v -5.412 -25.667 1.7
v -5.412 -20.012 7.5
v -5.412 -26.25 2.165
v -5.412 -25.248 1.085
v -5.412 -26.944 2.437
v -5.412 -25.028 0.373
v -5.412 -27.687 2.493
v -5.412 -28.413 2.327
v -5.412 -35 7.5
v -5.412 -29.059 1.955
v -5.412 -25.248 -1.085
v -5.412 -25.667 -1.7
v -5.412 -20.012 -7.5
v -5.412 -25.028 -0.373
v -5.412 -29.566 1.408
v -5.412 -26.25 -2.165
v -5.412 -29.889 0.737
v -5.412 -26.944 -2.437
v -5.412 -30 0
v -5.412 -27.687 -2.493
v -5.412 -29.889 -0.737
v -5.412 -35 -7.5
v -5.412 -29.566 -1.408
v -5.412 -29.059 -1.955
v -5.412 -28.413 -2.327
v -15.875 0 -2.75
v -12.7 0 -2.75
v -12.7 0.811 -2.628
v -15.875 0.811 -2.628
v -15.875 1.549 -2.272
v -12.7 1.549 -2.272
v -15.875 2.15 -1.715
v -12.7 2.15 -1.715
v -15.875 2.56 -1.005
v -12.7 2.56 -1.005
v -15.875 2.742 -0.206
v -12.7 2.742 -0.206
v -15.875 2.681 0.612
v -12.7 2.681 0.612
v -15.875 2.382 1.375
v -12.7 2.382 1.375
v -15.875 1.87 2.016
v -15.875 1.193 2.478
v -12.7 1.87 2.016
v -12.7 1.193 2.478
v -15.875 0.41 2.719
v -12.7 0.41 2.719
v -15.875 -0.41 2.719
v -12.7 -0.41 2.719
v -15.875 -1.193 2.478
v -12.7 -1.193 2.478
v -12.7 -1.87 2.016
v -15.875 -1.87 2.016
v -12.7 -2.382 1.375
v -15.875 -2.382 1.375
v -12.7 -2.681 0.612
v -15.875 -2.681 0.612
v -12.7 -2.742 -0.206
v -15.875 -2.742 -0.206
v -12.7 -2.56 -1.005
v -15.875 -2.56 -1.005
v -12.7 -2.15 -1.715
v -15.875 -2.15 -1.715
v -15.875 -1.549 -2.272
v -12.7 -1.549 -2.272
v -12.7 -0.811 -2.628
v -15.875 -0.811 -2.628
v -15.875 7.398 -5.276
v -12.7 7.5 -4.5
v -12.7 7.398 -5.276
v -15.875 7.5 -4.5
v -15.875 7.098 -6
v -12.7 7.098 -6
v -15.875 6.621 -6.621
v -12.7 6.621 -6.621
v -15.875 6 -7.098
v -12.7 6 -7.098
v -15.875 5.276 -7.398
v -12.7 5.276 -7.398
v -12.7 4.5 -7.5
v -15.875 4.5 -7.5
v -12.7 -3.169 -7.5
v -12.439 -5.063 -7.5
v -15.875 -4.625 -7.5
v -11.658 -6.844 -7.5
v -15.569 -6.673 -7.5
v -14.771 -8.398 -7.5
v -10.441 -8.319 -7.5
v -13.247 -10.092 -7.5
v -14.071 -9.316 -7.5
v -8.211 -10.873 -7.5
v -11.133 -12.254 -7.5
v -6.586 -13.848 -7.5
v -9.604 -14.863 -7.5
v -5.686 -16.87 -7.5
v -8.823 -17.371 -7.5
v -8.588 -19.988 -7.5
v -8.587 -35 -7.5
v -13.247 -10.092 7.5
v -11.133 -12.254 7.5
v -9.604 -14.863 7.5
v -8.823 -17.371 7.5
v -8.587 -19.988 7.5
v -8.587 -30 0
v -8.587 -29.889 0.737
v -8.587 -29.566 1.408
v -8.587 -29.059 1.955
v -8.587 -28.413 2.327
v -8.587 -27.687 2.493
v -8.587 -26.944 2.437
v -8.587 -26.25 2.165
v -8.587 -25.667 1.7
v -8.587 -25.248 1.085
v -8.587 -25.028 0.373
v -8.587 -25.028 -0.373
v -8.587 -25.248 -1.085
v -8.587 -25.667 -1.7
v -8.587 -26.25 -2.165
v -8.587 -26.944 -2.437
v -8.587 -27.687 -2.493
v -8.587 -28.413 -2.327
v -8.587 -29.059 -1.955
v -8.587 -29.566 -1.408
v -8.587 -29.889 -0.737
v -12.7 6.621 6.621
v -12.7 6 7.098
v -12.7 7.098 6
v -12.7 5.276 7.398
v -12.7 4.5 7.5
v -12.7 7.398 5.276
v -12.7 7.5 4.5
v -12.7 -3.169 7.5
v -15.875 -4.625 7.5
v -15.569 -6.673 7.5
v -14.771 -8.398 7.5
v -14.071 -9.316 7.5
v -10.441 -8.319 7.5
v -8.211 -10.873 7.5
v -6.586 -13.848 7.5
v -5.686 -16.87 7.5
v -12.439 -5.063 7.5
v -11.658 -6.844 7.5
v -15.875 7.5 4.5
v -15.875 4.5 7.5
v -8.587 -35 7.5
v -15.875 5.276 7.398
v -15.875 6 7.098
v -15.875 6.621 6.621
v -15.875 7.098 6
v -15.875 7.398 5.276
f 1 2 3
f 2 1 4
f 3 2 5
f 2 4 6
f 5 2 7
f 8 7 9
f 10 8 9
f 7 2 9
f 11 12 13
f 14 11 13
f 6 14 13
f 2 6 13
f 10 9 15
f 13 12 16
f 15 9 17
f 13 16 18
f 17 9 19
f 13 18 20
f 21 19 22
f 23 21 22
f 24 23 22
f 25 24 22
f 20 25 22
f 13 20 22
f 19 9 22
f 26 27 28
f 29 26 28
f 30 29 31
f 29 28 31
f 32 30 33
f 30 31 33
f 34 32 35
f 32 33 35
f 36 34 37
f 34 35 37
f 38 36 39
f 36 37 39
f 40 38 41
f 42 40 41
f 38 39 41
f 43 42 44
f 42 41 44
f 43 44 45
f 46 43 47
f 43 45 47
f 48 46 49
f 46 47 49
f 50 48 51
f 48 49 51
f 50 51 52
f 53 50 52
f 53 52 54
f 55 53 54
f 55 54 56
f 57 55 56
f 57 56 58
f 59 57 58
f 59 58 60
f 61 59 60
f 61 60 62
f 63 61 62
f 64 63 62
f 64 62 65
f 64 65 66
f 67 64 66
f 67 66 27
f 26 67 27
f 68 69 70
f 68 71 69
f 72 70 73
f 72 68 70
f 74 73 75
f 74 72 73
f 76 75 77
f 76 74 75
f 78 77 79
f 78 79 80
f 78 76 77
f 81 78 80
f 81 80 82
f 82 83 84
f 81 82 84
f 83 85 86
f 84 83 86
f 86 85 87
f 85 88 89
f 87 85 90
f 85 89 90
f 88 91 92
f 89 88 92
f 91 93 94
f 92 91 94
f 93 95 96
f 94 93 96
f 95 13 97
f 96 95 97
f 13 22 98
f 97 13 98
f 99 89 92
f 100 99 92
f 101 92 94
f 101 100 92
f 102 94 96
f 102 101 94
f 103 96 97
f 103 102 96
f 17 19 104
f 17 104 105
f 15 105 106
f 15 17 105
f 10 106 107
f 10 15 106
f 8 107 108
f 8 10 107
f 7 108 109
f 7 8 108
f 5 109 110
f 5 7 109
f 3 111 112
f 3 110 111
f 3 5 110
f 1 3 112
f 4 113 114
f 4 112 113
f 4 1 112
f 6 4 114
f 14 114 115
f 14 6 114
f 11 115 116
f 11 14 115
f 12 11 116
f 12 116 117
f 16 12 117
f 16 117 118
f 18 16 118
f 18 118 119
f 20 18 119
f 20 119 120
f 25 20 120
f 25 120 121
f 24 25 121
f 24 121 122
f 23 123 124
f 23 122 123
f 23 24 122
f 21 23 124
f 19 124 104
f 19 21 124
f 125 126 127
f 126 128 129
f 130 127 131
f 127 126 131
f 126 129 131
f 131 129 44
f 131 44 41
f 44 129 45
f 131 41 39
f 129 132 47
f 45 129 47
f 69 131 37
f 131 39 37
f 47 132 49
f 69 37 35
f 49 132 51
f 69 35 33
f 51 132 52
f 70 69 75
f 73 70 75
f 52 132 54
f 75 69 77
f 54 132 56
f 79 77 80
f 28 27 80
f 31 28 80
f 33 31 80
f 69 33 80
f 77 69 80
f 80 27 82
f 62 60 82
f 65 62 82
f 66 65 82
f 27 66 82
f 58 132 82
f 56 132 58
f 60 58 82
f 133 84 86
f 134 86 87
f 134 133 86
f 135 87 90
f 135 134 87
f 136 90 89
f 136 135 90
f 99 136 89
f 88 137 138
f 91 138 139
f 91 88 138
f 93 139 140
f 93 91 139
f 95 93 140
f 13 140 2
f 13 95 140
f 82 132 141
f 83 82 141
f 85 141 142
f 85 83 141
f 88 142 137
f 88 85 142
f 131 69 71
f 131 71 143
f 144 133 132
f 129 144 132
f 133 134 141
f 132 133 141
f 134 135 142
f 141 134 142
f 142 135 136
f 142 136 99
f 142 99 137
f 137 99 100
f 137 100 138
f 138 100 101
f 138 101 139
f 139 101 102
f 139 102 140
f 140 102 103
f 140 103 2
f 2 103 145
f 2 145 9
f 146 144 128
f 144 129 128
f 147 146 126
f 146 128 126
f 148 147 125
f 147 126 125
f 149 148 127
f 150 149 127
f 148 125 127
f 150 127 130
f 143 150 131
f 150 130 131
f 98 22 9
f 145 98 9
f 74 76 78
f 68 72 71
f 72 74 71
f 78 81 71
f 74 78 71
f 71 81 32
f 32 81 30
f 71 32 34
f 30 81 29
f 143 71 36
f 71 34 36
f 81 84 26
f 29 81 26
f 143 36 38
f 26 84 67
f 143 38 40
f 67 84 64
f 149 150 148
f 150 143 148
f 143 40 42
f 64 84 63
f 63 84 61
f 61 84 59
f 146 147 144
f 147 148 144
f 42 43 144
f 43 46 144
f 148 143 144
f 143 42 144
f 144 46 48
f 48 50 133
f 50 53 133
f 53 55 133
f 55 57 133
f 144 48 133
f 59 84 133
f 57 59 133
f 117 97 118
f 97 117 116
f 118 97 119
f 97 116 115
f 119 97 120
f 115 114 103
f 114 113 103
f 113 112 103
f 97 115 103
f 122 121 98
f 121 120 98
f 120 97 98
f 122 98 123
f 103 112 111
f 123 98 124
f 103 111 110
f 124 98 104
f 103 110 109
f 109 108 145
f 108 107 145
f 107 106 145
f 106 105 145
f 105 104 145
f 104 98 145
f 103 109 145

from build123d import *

# Parameters (mm, degrees)
FILLET1_R               = 7
M5_CLEARANCE_HOLE1_D    = 5.5
CUT_EXTRUDE1_DEPTH      = 37.52886072966826
CUT_EXTRUDE1_DEPTH_BACK = 37.52886072966826
SKETCH3_R               = 2.4999999999999996
FILLET2_R               = 3


with BuildPart() as part:
    # Sweep1: sweep along a path in Sketch1
    with BuildLine(Plane.XY) as sweep1_path:
        Line((-14.2875, 7.5), (-14.2875, -7.5))
        ThreePointArc((-14.2875, -7.5), (-8.903716825795872, -12.735560659438995), (-7.000000000000001, -20))
        Line((-7.000000000000001, -20), (-6.999999999999999, -35))
    # Sketch2 → Sweep1 (sweep)
    with BuildSketch(Plane(origin=(0, 0, 0), x_dir=(1, 0, 0), z_dir=(0, 1, 0))):
        Polygon((-12.699999999999996, -7.499999999999996), (-15.874999999999996, -7.499999999999996), (-15.874999999999996, 7.500000000000004), (-12.699999999999996, 7.500000000000005), align=None)
    sweep(path=sweep1_path.line, transition=Transition.RIGHT)

    # Fillet1
    fillet1_edges = [part.edges().sort_by_distance(p)[0] for p in [
        (-15.874999999999996, -8.441785890670294, -1.599e-14),
        (-12.699999999999996, -6.5917812273426035, -7.11e-15),
    ]]
    fillet(fillet1_edges, radius=FILLET1_R)

    # M5 Clearance Hole1 (through all)
    with Locations(Plane.ZY.offset(15.874999999999996)):
        with Locations((0, 0)):
            Hole(M5_CLEARANCE_HOLE1_D / 2)

    # Sketch3 → Cut-Extrude1 (cut, two sides: drawn at the far end of the back side and taken through both)
    with BuildSketch(Plane.ZY.offset(8.587500000000007).offset(-CUT_EXTRUDE1_DEPTH_BACK)):
        with Locations(Location((0, -27.500000000000004, 0), (0, 0, 270))):
            Circle(SKETCH3_R)
    extrude(amount=CUT_EXTRUDE1_DEPTH + CUT_EXTRUDE1_DEPTH_BACK, mode=Mode.SUBTRACT)

    # Fillet2
    fillet2_edges = [part.edges().sort_by_distance(p)[0] for p in [
        (-14.287499999999996, 7.5, 7.499999999999996),
        (-14.287499999999996, 7.5, -7.500000000000005),
    ]]
    fillet(fillet2_edges, radius=FILLET2_R)


solid = part.part
